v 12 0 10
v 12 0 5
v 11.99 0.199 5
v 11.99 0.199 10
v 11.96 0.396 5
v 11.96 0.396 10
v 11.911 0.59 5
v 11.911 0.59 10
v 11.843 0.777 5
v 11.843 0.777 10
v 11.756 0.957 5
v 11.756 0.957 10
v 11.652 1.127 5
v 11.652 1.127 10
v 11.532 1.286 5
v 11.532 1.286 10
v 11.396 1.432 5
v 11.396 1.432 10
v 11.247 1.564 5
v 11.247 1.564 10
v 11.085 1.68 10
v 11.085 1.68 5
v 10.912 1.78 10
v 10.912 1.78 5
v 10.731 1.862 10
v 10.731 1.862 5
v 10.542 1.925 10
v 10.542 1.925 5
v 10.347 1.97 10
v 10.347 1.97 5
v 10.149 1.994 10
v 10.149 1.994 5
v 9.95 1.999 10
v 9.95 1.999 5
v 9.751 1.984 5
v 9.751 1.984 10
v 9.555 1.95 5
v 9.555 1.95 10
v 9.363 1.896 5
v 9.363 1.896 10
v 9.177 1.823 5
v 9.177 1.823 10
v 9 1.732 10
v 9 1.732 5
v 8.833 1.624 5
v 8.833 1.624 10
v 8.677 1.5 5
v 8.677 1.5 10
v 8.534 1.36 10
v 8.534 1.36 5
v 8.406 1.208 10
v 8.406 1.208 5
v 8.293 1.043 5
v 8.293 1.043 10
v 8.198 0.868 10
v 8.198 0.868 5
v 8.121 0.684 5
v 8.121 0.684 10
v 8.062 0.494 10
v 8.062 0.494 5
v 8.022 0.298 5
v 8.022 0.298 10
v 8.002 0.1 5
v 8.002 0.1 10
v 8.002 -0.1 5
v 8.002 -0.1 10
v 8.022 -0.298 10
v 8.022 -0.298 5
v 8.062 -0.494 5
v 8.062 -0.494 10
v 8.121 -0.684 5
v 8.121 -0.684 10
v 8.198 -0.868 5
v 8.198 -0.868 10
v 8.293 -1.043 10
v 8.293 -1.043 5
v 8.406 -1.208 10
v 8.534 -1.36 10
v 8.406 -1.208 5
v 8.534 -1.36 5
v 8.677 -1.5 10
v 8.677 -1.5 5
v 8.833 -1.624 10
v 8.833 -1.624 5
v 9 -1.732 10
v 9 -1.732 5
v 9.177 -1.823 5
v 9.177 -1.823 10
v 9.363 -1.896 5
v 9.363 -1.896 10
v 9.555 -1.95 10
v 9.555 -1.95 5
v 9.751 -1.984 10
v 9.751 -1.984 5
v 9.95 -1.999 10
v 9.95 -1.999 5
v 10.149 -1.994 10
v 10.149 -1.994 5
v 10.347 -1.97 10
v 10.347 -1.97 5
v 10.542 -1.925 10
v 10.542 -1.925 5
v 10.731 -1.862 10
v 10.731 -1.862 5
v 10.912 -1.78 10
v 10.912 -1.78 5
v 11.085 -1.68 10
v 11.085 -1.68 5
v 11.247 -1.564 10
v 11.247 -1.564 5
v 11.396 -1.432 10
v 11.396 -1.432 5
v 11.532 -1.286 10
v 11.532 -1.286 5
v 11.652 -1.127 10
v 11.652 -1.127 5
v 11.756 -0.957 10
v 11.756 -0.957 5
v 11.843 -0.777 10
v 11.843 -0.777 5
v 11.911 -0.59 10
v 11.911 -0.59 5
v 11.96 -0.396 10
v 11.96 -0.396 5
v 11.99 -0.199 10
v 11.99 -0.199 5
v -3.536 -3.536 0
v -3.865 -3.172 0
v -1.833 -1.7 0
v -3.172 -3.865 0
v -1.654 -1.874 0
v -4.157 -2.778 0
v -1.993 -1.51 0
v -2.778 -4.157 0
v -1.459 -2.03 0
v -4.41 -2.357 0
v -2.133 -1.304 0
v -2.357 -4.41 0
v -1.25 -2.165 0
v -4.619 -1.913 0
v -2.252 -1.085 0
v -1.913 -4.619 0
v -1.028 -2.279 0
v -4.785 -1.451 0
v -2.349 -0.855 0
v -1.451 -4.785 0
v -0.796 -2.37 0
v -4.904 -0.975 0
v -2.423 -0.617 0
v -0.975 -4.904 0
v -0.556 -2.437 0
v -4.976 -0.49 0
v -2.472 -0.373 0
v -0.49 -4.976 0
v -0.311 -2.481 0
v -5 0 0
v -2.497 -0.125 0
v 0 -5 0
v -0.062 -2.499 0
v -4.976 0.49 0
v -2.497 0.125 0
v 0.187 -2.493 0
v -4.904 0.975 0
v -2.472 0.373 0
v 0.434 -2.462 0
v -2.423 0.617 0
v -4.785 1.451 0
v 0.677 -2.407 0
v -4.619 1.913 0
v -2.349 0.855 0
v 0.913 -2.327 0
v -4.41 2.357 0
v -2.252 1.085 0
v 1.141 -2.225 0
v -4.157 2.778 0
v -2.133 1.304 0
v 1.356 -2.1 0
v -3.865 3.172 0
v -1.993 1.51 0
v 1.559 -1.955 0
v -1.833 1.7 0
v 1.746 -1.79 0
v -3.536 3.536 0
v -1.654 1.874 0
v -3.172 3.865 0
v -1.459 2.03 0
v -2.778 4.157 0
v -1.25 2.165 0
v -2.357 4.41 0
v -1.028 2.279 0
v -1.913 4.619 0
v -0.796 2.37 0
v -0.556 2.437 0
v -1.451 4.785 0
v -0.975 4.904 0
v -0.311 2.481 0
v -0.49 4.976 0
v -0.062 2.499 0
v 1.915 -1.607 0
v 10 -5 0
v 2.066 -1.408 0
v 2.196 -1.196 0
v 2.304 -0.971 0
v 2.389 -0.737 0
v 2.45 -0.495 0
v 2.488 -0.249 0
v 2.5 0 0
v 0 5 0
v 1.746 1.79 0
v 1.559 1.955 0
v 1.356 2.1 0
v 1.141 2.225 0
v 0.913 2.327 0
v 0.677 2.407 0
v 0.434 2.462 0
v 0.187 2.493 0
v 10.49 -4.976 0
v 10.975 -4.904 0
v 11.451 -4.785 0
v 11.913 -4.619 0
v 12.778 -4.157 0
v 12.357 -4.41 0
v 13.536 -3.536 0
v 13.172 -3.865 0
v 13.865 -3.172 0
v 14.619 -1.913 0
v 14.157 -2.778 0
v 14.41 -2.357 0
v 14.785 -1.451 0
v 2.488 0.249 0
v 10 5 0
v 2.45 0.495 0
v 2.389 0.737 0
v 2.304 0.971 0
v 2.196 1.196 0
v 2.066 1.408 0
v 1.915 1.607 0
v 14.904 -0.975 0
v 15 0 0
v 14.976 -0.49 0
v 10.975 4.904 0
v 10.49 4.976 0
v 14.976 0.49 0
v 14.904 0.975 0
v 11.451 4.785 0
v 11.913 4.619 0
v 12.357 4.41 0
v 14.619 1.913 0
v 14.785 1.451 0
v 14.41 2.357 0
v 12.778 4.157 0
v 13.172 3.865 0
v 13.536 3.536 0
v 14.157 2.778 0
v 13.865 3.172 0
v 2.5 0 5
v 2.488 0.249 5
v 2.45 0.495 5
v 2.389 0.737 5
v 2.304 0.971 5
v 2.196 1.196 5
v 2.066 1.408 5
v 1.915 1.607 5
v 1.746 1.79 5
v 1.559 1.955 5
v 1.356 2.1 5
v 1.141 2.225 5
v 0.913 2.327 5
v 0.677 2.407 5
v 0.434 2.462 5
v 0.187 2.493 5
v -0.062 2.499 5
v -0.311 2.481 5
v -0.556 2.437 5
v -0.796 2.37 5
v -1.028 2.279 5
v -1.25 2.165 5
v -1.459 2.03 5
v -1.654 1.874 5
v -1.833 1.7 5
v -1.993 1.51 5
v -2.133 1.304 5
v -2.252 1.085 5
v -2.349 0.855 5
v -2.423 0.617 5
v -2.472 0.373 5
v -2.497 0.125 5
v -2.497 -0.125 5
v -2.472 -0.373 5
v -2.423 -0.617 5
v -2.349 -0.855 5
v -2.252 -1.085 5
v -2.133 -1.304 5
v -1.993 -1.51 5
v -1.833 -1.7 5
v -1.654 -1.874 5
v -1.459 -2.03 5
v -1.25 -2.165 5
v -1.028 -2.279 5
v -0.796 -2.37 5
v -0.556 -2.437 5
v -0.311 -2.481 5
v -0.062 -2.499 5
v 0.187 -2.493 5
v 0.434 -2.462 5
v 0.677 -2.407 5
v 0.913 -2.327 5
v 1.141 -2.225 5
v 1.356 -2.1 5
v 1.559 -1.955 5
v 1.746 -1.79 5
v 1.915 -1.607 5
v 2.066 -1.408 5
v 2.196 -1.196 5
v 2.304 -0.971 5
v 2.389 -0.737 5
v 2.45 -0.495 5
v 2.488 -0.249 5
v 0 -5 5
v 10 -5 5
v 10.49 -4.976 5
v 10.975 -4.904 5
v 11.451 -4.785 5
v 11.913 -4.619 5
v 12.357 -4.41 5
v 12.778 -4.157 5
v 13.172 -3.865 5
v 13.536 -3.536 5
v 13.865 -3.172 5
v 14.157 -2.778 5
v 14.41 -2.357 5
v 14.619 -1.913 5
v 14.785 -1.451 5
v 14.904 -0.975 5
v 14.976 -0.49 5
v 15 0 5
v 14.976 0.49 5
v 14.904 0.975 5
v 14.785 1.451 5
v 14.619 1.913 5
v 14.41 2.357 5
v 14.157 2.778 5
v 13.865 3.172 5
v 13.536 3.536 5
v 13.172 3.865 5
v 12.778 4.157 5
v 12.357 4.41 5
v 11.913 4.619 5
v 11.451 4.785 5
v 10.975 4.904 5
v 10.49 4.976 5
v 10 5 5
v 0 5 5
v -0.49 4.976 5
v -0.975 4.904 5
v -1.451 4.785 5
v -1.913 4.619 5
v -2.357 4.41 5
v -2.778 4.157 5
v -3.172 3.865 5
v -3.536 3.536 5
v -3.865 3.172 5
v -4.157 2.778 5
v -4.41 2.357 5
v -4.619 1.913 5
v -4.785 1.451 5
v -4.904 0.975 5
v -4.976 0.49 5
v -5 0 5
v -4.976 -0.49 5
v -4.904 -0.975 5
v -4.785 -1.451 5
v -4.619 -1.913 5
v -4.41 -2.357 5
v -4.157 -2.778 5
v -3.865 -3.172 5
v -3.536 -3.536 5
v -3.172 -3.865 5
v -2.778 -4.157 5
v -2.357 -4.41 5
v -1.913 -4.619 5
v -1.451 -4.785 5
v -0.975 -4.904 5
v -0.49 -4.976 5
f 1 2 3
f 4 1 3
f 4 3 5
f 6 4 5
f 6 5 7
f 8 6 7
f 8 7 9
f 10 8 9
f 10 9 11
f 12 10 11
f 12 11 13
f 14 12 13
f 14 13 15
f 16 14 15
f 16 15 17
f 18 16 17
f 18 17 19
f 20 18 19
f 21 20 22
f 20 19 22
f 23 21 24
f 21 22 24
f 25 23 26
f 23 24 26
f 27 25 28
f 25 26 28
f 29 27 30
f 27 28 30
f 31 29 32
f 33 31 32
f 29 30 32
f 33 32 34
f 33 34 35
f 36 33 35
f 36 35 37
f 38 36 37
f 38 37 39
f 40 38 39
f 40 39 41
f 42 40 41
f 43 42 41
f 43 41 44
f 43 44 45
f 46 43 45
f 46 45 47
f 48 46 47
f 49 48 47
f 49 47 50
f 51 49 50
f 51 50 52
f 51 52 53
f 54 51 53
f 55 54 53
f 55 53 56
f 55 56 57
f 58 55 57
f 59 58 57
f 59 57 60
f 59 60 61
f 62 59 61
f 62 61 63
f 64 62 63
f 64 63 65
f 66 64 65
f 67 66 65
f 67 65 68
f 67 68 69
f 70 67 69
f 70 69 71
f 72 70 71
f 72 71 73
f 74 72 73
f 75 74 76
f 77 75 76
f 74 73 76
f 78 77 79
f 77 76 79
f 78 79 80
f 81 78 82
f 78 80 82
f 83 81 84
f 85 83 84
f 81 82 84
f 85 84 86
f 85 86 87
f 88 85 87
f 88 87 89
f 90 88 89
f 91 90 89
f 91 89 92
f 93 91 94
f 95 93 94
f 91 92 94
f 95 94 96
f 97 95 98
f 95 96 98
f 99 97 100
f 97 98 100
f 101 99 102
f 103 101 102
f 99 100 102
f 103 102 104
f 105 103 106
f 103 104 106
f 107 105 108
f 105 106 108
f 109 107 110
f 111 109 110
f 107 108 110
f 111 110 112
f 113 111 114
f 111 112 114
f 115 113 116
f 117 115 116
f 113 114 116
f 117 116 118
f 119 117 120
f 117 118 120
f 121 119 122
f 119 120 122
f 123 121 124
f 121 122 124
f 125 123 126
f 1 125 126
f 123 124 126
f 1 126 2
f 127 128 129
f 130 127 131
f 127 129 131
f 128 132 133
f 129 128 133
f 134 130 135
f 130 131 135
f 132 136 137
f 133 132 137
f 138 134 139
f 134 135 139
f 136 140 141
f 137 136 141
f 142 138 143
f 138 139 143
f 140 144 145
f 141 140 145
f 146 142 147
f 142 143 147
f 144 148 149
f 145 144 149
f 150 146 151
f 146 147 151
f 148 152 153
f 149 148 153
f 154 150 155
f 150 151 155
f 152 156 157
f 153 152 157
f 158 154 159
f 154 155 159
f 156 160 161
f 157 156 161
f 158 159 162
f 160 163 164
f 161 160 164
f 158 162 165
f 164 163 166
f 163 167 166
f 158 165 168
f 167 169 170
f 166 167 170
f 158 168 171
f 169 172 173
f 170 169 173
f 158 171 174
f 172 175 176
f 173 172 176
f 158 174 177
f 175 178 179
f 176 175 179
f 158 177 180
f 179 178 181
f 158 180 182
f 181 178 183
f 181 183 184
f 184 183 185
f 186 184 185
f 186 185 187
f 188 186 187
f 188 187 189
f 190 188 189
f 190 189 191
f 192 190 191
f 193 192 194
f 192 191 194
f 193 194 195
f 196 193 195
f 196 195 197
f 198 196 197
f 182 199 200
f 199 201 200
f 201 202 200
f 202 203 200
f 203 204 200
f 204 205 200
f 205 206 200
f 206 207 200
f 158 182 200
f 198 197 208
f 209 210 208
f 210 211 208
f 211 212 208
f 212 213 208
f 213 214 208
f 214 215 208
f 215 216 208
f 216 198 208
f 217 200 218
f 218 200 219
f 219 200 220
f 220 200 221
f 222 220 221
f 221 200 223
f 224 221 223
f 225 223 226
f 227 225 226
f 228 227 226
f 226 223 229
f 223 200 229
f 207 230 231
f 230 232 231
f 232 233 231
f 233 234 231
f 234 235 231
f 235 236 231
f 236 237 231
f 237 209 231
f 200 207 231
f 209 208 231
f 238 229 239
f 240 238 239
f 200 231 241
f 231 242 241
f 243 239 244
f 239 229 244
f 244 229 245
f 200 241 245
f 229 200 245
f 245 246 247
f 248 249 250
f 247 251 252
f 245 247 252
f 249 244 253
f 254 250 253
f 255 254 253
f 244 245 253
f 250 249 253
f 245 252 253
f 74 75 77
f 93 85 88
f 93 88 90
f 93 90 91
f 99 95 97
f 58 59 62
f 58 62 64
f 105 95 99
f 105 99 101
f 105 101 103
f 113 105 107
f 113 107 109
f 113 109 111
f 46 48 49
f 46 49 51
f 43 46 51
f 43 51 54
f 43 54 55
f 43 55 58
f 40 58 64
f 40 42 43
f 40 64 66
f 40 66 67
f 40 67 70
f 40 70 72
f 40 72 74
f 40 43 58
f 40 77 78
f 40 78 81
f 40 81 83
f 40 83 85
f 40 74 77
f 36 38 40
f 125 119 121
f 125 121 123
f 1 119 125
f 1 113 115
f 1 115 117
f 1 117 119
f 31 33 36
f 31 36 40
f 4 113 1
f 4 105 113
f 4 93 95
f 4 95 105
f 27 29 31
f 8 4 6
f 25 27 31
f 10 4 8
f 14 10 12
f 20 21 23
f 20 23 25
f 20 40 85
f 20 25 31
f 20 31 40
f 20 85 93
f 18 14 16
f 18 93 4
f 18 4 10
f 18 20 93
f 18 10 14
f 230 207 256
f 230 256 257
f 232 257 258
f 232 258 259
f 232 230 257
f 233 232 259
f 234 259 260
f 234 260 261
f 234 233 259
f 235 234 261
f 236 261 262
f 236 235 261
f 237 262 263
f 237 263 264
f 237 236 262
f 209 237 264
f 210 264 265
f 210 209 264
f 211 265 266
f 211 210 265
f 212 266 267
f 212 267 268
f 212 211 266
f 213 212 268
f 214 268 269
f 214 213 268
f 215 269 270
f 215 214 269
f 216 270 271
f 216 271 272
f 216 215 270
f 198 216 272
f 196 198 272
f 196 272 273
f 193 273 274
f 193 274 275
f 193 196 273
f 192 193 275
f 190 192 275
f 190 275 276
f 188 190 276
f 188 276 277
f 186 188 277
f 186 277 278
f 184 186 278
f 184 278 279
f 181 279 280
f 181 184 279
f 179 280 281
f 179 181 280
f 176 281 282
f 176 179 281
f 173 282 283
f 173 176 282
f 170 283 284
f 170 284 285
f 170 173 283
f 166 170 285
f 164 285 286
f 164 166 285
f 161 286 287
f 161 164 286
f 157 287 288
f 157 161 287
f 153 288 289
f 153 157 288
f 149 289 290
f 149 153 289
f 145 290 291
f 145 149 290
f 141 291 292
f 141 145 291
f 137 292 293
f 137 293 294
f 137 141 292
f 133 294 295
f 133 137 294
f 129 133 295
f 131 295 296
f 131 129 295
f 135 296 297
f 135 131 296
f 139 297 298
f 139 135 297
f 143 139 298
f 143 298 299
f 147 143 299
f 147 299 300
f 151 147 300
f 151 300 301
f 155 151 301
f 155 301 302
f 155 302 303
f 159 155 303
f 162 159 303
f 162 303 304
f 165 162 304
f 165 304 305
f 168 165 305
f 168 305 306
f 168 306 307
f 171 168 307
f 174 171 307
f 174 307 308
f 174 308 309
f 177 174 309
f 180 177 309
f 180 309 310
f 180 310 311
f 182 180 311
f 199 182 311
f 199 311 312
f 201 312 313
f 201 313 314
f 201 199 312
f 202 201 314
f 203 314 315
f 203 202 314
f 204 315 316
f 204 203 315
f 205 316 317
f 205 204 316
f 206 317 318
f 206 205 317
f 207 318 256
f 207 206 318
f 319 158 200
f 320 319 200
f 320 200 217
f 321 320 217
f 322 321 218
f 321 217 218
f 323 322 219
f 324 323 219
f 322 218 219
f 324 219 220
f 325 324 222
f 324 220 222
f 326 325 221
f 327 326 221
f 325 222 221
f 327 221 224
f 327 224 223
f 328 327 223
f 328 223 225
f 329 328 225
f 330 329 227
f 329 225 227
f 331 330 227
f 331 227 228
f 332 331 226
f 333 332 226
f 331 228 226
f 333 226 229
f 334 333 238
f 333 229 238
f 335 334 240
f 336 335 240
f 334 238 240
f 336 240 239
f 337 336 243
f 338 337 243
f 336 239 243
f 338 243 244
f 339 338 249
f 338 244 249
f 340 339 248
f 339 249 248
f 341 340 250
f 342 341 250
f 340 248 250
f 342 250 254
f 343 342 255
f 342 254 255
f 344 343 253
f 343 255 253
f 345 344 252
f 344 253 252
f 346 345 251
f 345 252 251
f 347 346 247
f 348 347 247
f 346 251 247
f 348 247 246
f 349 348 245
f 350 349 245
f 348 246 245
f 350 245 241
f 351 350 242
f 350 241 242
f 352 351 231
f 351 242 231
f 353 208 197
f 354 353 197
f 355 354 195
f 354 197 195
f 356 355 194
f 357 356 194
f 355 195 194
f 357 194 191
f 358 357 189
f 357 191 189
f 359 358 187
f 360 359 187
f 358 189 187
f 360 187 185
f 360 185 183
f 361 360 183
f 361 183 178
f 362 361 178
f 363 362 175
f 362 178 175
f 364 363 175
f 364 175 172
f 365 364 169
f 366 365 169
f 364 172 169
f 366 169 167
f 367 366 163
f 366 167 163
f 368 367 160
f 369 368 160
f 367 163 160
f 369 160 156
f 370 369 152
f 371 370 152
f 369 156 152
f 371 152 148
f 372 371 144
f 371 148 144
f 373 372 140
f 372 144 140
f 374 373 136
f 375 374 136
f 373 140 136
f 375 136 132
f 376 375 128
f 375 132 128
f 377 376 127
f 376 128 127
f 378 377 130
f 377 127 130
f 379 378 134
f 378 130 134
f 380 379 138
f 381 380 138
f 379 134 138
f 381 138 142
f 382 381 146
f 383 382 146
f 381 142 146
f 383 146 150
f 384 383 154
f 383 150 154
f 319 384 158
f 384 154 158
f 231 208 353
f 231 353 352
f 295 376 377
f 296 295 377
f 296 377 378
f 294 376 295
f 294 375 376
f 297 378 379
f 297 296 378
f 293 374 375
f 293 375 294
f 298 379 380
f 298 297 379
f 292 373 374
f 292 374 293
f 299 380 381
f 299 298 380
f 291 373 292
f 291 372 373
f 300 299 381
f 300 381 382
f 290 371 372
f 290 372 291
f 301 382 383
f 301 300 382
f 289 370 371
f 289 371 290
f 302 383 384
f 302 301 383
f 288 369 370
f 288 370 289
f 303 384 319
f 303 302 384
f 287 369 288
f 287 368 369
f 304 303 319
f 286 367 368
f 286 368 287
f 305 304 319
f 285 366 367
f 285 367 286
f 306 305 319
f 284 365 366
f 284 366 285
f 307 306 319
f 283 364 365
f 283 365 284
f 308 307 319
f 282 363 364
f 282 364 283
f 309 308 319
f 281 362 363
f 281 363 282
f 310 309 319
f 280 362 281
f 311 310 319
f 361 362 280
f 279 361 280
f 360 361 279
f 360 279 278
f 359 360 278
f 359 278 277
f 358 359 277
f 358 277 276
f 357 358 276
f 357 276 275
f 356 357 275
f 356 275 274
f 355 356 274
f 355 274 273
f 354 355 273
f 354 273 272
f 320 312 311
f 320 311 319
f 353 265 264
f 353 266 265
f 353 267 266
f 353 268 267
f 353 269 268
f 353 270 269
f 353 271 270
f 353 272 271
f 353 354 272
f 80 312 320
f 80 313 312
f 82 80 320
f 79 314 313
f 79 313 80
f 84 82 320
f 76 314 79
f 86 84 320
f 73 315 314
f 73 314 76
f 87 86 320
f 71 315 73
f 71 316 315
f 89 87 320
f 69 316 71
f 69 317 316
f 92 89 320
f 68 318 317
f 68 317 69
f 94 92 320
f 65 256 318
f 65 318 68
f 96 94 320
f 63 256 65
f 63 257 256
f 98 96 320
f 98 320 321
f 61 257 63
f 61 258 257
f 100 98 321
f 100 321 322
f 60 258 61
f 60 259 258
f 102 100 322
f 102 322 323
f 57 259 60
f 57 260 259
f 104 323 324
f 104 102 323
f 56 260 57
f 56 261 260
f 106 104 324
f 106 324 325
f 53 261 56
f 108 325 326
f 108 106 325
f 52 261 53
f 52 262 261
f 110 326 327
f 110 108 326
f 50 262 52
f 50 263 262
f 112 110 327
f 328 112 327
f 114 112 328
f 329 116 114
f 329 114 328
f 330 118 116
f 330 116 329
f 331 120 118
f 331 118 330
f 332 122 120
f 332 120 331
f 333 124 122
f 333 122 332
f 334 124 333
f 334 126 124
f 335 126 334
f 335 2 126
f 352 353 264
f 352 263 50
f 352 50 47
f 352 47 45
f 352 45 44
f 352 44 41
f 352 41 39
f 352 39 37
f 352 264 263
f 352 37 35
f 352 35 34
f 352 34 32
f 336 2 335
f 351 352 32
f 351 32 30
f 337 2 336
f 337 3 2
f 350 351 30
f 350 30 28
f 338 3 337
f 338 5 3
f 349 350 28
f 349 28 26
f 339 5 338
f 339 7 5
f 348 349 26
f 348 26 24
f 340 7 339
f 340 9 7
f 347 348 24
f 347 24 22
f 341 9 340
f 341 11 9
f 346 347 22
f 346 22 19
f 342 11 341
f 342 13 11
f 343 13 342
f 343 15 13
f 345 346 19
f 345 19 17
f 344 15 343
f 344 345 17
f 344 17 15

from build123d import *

# Parameters (mm, degrees)
CYLINDER_R     = 2
CYLINDER_DEPTH = 10
SKETCH_R       = 2.5
EXTRUDE_DEPTH  = 5


with BuildPart() as pin:
    # Cylinder → Cylinder (new body)
    with BuildSketch(Plane(origin=(10, 0, 0), x_dir=(1, 0, 0), z_dir=(0, 0, 1))):
        Circle(CYLINDER_R)
    extrude(amount=CYLINDER_DEPTH)


with BuildPart() as fusion:
    # Sketch → Extrude (new body)
    with BuildSketch(Plane.XY):
        with BuildLine():
            ThreePointArc((0, 5), (-5, 0), (0, -5))
            Line((0, -5), (10, -5))
            ThreePointArc((10, -5), (15, 0), (10, 5))
            Line((0, 5), (10, 5))
        make_face()
        Circle(SKETCH_R, mode=Mode.SUBTRACT)
    extrude(amount=EXTRUDE_DEPTH)

    # Fusion: union Pin
    add(pin.part)


solid = fusion.part
